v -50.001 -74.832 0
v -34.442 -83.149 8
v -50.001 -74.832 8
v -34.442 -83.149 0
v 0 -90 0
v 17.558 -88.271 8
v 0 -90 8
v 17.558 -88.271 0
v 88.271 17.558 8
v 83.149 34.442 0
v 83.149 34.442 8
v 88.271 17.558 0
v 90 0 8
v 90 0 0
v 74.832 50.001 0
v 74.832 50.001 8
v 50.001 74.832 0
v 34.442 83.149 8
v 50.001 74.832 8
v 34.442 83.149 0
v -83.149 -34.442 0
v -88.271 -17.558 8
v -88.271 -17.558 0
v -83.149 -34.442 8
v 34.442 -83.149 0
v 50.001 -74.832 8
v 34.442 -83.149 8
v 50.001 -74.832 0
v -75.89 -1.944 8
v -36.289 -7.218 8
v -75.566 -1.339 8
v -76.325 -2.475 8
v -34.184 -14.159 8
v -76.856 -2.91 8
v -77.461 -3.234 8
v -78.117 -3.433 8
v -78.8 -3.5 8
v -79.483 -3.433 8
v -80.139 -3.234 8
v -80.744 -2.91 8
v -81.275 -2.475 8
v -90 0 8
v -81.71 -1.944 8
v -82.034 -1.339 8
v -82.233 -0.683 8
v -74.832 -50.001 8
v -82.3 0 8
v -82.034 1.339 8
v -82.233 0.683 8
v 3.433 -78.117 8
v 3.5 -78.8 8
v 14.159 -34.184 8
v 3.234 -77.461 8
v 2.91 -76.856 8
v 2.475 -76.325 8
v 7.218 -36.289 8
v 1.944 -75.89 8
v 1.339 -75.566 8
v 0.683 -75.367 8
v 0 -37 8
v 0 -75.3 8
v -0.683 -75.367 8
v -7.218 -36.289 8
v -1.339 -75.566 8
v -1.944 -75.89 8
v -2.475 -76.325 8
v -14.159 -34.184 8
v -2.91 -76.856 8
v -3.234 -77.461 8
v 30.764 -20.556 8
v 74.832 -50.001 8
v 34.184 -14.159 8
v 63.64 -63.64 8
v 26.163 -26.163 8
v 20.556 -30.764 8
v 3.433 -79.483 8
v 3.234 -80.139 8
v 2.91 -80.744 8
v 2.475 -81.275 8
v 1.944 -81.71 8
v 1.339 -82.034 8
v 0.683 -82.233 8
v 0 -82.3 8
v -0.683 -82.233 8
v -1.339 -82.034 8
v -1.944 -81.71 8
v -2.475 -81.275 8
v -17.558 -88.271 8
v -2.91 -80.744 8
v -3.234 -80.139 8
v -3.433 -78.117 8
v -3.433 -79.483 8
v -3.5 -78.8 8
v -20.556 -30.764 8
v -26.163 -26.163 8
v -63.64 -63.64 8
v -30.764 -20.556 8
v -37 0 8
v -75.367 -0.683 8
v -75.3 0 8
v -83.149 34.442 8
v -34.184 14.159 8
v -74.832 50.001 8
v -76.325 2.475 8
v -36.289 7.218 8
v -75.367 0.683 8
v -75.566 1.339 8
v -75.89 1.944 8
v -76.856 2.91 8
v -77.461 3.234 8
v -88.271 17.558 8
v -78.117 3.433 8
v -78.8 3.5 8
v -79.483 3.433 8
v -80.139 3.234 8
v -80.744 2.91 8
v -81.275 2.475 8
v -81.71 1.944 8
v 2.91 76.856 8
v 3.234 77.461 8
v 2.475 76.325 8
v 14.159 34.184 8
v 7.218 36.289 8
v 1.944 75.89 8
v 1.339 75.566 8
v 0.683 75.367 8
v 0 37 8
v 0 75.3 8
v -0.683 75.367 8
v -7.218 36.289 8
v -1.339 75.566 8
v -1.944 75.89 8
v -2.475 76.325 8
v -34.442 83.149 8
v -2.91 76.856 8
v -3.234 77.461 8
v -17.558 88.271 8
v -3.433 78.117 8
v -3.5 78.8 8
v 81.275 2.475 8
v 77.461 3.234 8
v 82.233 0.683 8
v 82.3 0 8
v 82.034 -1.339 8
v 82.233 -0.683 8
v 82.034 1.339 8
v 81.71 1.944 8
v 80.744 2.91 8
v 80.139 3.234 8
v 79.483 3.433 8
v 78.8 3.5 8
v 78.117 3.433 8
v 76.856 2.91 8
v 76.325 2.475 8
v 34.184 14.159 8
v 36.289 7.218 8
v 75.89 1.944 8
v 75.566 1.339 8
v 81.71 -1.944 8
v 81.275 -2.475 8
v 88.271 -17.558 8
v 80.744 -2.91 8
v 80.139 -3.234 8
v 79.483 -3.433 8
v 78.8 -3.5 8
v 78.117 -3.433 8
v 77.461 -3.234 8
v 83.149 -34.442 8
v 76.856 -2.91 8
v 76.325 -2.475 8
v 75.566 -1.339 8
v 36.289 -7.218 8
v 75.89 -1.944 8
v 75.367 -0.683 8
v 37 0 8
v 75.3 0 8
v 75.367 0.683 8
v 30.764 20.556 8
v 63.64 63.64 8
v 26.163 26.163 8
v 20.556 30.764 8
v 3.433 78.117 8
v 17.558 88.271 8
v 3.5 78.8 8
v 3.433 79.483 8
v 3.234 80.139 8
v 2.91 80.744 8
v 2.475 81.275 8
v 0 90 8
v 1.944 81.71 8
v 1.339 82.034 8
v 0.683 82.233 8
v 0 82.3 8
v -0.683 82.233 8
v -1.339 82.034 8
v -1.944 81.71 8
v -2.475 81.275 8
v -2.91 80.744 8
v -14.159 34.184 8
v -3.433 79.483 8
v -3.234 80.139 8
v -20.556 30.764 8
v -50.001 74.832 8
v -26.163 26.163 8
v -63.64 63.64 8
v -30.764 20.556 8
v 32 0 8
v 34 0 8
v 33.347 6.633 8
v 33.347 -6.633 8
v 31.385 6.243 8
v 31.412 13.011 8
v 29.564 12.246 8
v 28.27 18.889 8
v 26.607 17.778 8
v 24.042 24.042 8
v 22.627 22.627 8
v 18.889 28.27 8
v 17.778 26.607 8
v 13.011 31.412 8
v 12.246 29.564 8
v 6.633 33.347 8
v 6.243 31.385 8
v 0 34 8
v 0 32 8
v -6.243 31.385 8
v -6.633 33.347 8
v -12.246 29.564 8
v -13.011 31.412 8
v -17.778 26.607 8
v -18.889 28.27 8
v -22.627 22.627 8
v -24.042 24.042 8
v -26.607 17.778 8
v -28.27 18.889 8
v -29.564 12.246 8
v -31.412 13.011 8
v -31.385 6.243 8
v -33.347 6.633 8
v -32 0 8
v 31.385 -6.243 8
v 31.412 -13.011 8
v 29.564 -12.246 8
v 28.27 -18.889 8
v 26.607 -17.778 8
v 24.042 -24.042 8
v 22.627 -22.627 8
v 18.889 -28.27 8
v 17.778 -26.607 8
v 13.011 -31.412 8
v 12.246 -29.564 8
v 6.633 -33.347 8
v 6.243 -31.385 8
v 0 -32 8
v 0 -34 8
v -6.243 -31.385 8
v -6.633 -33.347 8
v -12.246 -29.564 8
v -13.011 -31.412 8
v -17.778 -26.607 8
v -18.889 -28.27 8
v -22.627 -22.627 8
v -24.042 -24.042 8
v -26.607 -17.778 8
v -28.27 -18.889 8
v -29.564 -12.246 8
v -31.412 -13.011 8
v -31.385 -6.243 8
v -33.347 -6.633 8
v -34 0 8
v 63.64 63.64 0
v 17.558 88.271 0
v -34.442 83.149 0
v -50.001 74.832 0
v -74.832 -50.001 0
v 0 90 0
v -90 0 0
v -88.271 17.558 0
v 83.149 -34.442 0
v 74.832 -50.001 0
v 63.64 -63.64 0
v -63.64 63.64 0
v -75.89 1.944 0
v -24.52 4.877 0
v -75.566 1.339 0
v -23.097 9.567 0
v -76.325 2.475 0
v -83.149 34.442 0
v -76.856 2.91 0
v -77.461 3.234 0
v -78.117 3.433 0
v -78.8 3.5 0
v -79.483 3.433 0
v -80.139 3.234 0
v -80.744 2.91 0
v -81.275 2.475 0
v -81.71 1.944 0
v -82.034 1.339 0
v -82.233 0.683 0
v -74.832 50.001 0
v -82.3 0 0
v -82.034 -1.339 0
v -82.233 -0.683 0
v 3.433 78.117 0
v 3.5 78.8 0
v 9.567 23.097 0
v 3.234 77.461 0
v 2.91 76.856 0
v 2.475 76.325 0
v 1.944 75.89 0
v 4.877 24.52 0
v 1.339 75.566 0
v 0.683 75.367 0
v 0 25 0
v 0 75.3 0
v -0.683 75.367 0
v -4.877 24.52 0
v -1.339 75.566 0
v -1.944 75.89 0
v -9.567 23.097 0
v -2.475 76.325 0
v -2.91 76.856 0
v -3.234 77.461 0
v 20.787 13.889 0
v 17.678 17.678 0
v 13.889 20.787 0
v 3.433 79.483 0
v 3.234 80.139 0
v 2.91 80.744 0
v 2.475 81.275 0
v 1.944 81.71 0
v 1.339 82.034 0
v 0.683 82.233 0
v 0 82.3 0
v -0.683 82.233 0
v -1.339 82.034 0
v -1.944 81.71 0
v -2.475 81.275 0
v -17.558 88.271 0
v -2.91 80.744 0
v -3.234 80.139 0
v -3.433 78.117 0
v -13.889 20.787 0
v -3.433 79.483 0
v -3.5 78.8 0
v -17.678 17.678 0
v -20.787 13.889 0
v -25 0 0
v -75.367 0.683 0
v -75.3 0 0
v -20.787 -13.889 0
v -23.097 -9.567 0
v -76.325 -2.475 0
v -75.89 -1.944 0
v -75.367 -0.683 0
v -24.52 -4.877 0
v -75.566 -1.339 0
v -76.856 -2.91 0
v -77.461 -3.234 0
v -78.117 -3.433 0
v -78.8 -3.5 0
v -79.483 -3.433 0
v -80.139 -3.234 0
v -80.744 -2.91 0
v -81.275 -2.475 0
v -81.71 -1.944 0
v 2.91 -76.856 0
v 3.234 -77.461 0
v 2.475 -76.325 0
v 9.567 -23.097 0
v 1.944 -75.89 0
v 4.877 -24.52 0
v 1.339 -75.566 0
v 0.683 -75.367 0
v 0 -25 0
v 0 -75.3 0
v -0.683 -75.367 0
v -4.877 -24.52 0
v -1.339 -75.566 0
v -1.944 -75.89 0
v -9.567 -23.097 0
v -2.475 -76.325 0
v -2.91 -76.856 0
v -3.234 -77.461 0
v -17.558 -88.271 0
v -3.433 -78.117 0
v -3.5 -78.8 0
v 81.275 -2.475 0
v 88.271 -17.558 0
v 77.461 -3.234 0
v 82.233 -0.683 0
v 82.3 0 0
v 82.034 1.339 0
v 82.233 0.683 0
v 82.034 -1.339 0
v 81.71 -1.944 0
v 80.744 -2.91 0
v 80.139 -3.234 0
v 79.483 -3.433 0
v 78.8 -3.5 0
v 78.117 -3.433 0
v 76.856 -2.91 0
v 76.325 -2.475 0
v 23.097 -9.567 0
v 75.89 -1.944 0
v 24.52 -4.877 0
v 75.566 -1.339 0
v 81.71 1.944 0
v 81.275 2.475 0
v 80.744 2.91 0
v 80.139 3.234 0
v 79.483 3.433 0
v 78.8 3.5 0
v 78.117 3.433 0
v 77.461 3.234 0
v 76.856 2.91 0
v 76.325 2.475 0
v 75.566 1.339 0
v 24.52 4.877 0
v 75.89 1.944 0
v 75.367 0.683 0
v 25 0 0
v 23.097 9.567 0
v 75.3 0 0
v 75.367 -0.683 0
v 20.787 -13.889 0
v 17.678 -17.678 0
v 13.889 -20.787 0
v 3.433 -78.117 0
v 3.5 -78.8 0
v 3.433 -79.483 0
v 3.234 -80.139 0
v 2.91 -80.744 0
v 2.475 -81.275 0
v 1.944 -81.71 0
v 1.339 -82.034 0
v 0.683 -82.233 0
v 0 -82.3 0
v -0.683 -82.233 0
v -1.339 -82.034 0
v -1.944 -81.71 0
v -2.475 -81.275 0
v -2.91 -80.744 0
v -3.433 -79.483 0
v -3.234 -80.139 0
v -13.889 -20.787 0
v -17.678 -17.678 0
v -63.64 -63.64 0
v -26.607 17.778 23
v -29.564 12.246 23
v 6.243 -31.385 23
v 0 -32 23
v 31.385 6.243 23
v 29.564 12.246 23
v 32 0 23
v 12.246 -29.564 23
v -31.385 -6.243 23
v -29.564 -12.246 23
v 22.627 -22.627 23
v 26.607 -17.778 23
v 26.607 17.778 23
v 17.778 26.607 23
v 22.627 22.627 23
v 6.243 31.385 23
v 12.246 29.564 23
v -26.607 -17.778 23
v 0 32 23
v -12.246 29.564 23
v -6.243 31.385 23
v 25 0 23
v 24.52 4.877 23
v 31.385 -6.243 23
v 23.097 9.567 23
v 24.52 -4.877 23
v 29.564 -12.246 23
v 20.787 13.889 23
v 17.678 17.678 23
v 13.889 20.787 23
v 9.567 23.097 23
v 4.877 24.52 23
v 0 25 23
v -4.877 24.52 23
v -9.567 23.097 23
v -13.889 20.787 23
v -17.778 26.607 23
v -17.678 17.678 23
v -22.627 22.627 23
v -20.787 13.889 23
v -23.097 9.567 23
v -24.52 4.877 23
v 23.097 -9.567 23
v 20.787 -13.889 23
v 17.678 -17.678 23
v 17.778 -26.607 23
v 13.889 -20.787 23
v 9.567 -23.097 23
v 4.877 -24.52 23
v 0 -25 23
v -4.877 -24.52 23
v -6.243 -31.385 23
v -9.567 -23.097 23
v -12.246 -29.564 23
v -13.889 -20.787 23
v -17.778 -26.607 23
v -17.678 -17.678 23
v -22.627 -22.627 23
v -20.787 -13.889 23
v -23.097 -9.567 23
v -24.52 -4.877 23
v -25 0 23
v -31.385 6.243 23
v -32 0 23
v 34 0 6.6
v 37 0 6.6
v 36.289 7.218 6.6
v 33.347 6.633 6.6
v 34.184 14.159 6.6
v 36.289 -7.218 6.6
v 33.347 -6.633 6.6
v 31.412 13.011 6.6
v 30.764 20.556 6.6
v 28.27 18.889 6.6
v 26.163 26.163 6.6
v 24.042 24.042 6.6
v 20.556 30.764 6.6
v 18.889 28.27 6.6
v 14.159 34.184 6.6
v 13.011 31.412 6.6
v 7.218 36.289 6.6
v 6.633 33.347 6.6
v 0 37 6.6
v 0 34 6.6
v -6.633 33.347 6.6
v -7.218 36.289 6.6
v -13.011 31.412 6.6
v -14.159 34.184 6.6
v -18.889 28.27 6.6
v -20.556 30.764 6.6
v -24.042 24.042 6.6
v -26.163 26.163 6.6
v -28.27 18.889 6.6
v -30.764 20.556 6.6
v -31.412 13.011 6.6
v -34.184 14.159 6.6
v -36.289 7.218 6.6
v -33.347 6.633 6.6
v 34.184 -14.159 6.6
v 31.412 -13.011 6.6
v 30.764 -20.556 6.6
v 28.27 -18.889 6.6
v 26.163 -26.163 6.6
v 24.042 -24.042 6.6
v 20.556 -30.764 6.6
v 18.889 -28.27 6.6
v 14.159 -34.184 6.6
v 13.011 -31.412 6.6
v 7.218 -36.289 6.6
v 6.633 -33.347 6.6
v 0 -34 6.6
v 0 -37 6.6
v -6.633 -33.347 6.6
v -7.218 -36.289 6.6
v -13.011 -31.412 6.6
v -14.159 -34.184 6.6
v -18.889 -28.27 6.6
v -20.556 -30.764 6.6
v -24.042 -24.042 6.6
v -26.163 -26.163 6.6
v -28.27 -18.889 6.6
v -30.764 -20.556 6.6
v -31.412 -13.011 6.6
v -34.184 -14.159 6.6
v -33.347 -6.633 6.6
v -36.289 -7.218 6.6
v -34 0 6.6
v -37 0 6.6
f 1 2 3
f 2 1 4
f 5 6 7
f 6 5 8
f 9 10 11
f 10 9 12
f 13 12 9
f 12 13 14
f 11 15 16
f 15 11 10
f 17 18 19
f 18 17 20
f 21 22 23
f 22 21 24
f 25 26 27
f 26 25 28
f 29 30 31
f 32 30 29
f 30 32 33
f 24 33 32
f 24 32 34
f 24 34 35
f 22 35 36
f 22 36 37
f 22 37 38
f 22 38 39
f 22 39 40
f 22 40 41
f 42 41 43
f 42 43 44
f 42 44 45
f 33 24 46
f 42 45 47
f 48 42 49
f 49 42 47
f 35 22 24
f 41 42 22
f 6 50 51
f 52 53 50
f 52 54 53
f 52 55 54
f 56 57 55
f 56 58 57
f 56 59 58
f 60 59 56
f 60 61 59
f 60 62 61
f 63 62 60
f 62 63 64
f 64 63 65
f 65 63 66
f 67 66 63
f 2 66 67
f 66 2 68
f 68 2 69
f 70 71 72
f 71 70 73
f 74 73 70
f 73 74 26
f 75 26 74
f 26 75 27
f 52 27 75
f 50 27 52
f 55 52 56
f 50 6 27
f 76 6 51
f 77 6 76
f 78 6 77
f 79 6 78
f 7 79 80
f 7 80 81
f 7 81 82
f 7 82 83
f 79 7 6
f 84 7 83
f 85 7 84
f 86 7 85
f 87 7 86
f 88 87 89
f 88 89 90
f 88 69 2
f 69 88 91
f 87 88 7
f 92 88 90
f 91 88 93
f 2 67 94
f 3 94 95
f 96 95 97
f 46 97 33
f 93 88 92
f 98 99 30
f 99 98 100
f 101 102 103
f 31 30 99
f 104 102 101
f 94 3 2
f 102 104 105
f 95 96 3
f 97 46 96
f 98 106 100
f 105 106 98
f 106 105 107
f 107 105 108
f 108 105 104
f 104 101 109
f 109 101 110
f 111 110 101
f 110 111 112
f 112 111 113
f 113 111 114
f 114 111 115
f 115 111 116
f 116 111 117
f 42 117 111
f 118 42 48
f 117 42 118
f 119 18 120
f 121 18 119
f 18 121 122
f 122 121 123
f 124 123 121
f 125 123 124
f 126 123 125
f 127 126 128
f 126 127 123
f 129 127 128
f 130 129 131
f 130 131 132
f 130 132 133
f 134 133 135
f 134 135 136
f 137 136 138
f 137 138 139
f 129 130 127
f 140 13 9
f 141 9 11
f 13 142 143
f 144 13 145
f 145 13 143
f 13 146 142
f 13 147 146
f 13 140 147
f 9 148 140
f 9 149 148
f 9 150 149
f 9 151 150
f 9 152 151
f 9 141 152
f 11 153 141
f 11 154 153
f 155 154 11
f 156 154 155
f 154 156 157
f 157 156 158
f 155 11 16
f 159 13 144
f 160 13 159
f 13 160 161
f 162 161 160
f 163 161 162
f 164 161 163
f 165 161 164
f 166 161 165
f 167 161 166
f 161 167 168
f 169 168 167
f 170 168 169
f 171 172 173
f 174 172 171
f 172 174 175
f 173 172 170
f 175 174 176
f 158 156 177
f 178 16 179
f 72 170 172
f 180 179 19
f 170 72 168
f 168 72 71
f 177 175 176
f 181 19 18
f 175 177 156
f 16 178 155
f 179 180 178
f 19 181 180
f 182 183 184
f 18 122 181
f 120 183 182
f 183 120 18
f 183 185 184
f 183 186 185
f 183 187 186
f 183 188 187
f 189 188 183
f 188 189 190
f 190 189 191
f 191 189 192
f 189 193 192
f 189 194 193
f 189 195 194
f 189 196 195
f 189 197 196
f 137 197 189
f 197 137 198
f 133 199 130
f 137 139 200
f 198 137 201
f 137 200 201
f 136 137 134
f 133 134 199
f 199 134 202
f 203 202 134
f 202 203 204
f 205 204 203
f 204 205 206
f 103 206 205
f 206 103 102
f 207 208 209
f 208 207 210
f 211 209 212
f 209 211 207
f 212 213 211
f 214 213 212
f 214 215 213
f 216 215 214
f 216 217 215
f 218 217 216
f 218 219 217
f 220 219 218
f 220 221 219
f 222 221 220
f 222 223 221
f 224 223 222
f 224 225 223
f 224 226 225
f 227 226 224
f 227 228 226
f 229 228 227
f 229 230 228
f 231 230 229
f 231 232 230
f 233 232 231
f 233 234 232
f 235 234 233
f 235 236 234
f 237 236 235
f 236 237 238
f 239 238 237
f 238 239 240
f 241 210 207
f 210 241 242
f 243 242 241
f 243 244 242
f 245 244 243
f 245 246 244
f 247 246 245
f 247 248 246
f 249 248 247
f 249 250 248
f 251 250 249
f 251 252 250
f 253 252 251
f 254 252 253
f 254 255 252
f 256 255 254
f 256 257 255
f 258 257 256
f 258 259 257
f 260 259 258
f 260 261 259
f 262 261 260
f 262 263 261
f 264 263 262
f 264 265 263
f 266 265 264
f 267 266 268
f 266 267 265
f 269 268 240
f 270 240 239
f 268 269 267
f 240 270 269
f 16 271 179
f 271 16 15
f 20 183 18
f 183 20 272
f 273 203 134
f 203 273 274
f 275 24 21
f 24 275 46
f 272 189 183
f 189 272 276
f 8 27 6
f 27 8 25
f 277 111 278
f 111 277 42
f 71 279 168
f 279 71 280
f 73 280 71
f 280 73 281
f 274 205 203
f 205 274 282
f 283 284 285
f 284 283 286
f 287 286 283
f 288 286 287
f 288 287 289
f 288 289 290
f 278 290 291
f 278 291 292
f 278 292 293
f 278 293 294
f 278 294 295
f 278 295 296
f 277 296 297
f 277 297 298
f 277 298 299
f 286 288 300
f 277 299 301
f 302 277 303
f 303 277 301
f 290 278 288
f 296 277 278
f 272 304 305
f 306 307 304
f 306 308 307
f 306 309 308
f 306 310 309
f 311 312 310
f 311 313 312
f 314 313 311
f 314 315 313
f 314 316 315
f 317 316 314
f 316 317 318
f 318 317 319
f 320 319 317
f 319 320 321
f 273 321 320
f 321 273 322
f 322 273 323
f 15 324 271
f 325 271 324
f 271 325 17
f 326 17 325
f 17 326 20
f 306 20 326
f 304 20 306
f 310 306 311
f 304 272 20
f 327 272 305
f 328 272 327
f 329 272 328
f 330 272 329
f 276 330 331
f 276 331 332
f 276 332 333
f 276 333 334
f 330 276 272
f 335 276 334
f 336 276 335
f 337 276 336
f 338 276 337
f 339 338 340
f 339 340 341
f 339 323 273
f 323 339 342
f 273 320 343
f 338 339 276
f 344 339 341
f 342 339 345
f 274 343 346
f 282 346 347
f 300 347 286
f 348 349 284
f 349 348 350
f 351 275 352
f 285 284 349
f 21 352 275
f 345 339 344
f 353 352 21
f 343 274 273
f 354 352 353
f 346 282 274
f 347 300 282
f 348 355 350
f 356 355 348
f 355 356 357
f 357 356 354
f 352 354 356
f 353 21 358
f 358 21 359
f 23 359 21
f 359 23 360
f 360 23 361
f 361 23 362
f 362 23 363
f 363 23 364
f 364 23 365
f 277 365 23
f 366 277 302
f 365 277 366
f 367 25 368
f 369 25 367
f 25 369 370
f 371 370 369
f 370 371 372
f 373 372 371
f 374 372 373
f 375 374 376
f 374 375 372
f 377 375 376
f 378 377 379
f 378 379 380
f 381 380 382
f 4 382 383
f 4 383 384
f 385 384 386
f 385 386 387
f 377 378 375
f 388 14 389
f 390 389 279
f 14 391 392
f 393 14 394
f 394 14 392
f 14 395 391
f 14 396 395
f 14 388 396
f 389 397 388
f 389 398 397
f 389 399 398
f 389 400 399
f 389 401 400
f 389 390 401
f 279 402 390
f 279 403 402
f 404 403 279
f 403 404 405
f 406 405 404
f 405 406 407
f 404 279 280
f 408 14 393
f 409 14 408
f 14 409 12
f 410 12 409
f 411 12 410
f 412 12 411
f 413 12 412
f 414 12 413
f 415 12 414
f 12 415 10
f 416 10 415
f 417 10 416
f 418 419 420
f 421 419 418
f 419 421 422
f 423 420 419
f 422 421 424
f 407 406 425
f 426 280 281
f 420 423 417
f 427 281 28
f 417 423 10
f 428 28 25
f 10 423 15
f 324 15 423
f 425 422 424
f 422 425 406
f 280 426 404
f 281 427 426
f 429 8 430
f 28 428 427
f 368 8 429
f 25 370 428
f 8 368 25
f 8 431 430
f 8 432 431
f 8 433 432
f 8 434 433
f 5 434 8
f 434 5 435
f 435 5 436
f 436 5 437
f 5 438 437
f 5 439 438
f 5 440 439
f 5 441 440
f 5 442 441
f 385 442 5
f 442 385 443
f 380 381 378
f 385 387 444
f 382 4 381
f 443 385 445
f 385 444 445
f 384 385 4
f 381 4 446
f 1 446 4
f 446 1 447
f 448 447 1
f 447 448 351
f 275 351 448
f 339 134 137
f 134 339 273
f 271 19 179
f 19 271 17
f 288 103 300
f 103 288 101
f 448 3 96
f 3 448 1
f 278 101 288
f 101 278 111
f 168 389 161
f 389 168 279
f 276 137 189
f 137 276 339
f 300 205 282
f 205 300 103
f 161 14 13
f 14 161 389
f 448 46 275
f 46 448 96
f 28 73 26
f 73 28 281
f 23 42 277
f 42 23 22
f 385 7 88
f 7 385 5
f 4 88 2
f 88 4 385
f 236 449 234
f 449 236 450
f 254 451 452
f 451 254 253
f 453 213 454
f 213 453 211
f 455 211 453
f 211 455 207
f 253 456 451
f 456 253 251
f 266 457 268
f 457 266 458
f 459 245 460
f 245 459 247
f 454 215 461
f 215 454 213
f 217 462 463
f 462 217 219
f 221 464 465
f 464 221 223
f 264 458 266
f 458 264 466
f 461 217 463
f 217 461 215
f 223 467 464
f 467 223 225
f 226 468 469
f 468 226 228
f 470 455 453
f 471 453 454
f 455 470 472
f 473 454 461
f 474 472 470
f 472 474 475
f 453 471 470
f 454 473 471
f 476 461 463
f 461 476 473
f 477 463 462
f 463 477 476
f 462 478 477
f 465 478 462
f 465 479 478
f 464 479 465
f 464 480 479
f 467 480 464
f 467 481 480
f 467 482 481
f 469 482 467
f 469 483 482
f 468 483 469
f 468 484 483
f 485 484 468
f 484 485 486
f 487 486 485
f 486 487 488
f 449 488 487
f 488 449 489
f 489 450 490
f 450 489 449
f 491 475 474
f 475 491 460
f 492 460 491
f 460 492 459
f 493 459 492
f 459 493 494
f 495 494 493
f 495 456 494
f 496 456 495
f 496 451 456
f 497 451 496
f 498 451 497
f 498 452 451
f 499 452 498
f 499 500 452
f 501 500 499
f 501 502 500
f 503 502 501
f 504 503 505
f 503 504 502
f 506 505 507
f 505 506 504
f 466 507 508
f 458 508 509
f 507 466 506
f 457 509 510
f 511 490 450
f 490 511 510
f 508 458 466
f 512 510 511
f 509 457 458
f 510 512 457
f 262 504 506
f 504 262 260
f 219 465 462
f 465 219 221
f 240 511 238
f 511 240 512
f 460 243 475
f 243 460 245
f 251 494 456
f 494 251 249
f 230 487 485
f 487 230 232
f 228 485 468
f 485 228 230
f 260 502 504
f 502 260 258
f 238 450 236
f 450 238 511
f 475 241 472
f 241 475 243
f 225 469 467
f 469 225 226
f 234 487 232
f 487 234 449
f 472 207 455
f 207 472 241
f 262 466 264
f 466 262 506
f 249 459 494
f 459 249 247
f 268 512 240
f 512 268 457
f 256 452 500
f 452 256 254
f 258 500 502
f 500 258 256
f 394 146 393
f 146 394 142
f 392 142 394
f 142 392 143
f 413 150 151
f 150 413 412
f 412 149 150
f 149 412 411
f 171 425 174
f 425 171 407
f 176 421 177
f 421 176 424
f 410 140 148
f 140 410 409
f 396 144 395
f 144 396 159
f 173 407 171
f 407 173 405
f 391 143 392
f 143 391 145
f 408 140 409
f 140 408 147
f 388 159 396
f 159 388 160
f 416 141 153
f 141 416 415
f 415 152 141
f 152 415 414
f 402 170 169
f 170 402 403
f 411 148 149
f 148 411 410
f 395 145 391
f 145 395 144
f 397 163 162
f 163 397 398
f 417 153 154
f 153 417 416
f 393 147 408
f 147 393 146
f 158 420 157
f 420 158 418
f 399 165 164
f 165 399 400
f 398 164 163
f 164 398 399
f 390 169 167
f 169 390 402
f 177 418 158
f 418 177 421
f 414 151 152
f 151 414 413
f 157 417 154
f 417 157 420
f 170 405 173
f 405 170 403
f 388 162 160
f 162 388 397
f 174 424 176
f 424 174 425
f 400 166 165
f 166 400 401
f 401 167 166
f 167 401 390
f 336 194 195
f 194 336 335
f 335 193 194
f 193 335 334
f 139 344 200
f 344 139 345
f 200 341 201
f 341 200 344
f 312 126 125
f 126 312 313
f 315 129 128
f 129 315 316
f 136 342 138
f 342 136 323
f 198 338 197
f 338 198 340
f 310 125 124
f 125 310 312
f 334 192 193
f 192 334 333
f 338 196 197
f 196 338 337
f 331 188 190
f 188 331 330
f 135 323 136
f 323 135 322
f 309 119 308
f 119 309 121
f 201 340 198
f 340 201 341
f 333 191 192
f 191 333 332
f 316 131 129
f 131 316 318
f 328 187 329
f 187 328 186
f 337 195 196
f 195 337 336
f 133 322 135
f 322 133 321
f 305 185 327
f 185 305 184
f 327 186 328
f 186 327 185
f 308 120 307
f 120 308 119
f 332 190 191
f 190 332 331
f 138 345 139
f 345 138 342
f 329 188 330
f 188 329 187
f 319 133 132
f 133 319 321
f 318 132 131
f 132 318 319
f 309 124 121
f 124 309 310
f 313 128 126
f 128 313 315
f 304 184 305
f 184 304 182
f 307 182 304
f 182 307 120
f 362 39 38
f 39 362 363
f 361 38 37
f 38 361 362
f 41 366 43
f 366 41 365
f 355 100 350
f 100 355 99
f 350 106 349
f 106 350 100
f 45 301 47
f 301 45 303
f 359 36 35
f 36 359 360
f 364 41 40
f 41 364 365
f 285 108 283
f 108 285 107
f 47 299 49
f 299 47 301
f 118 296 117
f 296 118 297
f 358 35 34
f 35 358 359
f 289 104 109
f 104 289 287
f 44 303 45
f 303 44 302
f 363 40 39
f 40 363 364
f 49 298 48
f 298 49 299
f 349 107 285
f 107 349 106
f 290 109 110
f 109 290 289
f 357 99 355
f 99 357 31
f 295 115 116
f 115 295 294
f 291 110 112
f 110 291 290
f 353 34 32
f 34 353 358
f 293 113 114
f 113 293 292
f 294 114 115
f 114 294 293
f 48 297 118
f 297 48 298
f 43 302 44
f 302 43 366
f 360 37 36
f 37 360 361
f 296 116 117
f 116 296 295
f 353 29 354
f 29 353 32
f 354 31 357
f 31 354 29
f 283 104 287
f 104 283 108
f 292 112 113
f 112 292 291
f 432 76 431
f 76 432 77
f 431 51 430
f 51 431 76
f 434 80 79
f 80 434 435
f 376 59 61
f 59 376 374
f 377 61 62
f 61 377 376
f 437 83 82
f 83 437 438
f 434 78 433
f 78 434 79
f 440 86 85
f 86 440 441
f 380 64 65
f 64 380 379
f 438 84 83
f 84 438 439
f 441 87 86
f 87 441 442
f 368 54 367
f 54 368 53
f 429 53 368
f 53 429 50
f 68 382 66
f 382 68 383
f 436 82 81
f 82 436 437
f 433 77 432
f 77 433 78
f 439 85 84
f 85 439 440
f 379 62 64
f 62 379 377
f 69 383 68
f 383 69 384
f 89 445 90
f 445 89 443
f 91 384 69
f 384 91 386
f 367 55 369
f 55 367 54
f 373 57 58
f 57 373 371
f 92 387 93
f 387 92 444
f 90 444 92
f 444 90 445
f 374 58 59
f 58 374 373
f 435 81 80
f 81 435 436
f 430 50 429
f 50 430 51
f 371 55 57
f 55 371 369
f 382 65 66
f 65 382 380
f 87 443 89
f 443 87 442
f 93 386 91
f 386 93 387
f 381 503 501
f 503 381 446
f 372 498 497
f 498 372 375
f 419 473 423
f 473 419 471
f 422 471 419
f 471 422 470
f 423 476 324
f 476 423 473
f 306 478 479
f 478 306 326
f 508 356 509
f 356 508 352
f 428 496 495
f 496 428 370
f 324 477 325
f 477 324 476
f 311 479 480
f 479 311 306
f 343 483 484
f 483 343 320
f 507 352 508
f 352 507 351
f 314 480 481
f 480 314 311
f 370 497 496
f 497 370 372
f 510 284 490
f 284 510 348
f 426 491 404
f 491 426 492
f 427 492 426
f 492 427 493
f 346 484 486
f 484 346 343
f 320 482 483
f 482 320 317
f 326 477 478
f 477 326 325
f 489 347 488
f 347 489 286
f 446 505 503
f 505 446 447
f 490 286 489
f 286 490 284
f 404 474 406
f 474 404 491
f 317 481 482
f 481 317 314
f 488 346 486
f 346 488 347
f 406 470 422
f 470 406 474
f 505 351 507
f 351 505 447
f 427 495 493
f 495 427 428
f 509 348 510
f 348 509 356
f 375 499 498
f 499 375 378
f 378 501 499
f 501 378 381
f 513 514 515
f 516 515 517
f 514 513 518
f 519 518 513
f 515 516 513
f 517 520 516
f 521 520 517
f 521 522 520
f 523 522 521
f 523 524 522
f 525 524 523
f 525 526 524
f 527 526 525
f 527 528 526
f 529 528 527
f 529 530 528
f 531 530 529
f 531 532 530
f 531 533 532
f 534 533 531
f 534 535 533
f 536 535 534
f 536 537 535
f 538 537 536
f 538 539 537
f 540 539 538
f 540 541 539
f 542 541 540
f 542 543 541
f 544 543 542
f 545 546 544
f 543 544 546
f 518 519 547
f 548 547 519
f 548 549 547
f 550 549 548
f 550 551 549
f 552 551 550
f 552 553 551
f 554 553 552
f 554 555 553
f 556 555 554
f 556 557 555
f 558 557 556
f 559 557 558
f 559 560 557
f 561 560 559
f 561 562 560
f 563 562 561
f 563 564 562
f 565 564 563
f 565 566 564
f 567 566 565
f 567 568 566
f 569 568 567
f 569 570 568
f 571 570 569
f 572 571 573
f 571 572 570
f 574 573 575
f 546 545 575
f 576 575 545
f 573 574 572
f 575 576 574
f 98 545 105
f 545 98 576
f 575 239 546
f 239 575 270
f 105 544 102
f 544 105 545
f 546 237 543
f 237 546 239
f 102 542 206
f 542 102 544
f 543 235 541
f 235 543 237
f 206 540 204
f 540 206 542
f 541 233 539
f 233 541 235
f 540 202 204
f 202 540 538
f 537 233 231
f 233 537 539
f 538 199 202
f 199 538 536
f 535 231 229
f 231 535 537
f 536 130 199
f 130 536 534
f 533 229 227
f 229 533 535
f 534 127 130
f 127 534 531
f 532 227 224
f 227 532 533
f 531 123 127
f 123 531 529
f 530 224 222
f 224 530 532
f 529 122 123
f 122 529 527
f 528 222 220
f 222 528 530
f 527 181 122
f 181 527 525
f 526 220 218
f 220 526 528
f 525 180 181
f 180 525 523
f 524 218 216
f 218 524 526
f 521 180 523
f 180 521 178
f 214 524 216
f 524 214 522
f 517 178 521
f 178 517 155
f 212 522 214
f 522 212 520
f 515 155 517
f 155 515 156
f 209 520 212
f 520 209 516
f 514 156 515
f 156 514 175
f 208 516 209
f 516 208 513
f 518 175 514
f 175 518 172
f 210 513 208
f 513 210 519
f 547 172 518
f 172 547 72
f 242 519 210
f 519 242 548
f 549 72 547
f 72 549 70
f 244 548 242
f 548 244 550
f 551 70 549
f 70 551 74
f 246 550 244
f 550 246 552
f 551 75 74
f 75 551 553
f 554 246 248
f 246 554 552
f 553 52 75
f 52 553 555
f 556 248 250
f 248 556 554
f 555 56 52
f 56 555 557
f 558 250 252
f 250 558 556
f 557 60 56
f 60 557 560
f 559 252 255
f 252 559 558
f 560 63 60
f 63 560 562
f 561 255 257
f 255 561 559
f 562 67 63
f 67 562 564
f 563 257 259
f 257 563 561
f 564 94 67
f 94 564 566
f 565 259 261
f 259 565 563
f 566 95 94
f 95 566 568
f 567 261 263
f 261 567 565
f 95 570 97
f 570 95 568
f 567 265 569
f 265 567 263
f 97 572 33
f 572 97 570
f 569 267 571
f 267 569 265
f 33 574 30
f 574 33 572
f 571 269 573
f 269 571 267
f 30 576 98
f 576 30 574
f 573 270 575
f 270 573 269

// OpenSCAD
$fn = 32;

// ----------------------------------------------------------------------
// Bolt-circle flange: 180 mm outside, 4 bolt holes, bore 50 mm
// ----------------------------------------------------------------------

// --- parameters (mm) ---
flange_d = 180;           // flange outside diameter
flange_t = 8;             // flange thickness
bolts = 4;                // number of bolt holes
bolt_d = 7;               // bolt clearance
bolt_r = 78.8;            // bolt circle radius
bore_d = 50;              // centre bore
hub_d = 64;               // raised hub diameter
hub_h = 15;               // raised hub height
groove_w = 3;             // gasket groove width
groove_d = 1.4;           // gasket groove depth
groove_r = 34;            // groove radius
groove_z = 6.6;           // groove floor depth from the face

module body() {
  cylinder(h = flange_t, d = flange_d);
  /* raised hub, sunk 1 mm into the flange */
  translate([0, 0, flange_t - 1]) cylinder(h = hub_h + 1, d = hub_d);
}

difference() {
  body();
  /* bolt circle */
  for (i = [0 : bolts - 1]) rotate([0, 0, i * 360 / bolts]) translate([bolt_r, 0, -1]) cylinder(h = flange_t + hub_h + 3, d = bolt_d);
  translate([0, 0, -1]) cylinder(h = flange_t + hub_h + 3, d = bore_d);
  /* gasket groove on the front face */
  rotate_extrude() translate([groove_r, groove_z]) square([groove_w, groove_d + 1]);
}
